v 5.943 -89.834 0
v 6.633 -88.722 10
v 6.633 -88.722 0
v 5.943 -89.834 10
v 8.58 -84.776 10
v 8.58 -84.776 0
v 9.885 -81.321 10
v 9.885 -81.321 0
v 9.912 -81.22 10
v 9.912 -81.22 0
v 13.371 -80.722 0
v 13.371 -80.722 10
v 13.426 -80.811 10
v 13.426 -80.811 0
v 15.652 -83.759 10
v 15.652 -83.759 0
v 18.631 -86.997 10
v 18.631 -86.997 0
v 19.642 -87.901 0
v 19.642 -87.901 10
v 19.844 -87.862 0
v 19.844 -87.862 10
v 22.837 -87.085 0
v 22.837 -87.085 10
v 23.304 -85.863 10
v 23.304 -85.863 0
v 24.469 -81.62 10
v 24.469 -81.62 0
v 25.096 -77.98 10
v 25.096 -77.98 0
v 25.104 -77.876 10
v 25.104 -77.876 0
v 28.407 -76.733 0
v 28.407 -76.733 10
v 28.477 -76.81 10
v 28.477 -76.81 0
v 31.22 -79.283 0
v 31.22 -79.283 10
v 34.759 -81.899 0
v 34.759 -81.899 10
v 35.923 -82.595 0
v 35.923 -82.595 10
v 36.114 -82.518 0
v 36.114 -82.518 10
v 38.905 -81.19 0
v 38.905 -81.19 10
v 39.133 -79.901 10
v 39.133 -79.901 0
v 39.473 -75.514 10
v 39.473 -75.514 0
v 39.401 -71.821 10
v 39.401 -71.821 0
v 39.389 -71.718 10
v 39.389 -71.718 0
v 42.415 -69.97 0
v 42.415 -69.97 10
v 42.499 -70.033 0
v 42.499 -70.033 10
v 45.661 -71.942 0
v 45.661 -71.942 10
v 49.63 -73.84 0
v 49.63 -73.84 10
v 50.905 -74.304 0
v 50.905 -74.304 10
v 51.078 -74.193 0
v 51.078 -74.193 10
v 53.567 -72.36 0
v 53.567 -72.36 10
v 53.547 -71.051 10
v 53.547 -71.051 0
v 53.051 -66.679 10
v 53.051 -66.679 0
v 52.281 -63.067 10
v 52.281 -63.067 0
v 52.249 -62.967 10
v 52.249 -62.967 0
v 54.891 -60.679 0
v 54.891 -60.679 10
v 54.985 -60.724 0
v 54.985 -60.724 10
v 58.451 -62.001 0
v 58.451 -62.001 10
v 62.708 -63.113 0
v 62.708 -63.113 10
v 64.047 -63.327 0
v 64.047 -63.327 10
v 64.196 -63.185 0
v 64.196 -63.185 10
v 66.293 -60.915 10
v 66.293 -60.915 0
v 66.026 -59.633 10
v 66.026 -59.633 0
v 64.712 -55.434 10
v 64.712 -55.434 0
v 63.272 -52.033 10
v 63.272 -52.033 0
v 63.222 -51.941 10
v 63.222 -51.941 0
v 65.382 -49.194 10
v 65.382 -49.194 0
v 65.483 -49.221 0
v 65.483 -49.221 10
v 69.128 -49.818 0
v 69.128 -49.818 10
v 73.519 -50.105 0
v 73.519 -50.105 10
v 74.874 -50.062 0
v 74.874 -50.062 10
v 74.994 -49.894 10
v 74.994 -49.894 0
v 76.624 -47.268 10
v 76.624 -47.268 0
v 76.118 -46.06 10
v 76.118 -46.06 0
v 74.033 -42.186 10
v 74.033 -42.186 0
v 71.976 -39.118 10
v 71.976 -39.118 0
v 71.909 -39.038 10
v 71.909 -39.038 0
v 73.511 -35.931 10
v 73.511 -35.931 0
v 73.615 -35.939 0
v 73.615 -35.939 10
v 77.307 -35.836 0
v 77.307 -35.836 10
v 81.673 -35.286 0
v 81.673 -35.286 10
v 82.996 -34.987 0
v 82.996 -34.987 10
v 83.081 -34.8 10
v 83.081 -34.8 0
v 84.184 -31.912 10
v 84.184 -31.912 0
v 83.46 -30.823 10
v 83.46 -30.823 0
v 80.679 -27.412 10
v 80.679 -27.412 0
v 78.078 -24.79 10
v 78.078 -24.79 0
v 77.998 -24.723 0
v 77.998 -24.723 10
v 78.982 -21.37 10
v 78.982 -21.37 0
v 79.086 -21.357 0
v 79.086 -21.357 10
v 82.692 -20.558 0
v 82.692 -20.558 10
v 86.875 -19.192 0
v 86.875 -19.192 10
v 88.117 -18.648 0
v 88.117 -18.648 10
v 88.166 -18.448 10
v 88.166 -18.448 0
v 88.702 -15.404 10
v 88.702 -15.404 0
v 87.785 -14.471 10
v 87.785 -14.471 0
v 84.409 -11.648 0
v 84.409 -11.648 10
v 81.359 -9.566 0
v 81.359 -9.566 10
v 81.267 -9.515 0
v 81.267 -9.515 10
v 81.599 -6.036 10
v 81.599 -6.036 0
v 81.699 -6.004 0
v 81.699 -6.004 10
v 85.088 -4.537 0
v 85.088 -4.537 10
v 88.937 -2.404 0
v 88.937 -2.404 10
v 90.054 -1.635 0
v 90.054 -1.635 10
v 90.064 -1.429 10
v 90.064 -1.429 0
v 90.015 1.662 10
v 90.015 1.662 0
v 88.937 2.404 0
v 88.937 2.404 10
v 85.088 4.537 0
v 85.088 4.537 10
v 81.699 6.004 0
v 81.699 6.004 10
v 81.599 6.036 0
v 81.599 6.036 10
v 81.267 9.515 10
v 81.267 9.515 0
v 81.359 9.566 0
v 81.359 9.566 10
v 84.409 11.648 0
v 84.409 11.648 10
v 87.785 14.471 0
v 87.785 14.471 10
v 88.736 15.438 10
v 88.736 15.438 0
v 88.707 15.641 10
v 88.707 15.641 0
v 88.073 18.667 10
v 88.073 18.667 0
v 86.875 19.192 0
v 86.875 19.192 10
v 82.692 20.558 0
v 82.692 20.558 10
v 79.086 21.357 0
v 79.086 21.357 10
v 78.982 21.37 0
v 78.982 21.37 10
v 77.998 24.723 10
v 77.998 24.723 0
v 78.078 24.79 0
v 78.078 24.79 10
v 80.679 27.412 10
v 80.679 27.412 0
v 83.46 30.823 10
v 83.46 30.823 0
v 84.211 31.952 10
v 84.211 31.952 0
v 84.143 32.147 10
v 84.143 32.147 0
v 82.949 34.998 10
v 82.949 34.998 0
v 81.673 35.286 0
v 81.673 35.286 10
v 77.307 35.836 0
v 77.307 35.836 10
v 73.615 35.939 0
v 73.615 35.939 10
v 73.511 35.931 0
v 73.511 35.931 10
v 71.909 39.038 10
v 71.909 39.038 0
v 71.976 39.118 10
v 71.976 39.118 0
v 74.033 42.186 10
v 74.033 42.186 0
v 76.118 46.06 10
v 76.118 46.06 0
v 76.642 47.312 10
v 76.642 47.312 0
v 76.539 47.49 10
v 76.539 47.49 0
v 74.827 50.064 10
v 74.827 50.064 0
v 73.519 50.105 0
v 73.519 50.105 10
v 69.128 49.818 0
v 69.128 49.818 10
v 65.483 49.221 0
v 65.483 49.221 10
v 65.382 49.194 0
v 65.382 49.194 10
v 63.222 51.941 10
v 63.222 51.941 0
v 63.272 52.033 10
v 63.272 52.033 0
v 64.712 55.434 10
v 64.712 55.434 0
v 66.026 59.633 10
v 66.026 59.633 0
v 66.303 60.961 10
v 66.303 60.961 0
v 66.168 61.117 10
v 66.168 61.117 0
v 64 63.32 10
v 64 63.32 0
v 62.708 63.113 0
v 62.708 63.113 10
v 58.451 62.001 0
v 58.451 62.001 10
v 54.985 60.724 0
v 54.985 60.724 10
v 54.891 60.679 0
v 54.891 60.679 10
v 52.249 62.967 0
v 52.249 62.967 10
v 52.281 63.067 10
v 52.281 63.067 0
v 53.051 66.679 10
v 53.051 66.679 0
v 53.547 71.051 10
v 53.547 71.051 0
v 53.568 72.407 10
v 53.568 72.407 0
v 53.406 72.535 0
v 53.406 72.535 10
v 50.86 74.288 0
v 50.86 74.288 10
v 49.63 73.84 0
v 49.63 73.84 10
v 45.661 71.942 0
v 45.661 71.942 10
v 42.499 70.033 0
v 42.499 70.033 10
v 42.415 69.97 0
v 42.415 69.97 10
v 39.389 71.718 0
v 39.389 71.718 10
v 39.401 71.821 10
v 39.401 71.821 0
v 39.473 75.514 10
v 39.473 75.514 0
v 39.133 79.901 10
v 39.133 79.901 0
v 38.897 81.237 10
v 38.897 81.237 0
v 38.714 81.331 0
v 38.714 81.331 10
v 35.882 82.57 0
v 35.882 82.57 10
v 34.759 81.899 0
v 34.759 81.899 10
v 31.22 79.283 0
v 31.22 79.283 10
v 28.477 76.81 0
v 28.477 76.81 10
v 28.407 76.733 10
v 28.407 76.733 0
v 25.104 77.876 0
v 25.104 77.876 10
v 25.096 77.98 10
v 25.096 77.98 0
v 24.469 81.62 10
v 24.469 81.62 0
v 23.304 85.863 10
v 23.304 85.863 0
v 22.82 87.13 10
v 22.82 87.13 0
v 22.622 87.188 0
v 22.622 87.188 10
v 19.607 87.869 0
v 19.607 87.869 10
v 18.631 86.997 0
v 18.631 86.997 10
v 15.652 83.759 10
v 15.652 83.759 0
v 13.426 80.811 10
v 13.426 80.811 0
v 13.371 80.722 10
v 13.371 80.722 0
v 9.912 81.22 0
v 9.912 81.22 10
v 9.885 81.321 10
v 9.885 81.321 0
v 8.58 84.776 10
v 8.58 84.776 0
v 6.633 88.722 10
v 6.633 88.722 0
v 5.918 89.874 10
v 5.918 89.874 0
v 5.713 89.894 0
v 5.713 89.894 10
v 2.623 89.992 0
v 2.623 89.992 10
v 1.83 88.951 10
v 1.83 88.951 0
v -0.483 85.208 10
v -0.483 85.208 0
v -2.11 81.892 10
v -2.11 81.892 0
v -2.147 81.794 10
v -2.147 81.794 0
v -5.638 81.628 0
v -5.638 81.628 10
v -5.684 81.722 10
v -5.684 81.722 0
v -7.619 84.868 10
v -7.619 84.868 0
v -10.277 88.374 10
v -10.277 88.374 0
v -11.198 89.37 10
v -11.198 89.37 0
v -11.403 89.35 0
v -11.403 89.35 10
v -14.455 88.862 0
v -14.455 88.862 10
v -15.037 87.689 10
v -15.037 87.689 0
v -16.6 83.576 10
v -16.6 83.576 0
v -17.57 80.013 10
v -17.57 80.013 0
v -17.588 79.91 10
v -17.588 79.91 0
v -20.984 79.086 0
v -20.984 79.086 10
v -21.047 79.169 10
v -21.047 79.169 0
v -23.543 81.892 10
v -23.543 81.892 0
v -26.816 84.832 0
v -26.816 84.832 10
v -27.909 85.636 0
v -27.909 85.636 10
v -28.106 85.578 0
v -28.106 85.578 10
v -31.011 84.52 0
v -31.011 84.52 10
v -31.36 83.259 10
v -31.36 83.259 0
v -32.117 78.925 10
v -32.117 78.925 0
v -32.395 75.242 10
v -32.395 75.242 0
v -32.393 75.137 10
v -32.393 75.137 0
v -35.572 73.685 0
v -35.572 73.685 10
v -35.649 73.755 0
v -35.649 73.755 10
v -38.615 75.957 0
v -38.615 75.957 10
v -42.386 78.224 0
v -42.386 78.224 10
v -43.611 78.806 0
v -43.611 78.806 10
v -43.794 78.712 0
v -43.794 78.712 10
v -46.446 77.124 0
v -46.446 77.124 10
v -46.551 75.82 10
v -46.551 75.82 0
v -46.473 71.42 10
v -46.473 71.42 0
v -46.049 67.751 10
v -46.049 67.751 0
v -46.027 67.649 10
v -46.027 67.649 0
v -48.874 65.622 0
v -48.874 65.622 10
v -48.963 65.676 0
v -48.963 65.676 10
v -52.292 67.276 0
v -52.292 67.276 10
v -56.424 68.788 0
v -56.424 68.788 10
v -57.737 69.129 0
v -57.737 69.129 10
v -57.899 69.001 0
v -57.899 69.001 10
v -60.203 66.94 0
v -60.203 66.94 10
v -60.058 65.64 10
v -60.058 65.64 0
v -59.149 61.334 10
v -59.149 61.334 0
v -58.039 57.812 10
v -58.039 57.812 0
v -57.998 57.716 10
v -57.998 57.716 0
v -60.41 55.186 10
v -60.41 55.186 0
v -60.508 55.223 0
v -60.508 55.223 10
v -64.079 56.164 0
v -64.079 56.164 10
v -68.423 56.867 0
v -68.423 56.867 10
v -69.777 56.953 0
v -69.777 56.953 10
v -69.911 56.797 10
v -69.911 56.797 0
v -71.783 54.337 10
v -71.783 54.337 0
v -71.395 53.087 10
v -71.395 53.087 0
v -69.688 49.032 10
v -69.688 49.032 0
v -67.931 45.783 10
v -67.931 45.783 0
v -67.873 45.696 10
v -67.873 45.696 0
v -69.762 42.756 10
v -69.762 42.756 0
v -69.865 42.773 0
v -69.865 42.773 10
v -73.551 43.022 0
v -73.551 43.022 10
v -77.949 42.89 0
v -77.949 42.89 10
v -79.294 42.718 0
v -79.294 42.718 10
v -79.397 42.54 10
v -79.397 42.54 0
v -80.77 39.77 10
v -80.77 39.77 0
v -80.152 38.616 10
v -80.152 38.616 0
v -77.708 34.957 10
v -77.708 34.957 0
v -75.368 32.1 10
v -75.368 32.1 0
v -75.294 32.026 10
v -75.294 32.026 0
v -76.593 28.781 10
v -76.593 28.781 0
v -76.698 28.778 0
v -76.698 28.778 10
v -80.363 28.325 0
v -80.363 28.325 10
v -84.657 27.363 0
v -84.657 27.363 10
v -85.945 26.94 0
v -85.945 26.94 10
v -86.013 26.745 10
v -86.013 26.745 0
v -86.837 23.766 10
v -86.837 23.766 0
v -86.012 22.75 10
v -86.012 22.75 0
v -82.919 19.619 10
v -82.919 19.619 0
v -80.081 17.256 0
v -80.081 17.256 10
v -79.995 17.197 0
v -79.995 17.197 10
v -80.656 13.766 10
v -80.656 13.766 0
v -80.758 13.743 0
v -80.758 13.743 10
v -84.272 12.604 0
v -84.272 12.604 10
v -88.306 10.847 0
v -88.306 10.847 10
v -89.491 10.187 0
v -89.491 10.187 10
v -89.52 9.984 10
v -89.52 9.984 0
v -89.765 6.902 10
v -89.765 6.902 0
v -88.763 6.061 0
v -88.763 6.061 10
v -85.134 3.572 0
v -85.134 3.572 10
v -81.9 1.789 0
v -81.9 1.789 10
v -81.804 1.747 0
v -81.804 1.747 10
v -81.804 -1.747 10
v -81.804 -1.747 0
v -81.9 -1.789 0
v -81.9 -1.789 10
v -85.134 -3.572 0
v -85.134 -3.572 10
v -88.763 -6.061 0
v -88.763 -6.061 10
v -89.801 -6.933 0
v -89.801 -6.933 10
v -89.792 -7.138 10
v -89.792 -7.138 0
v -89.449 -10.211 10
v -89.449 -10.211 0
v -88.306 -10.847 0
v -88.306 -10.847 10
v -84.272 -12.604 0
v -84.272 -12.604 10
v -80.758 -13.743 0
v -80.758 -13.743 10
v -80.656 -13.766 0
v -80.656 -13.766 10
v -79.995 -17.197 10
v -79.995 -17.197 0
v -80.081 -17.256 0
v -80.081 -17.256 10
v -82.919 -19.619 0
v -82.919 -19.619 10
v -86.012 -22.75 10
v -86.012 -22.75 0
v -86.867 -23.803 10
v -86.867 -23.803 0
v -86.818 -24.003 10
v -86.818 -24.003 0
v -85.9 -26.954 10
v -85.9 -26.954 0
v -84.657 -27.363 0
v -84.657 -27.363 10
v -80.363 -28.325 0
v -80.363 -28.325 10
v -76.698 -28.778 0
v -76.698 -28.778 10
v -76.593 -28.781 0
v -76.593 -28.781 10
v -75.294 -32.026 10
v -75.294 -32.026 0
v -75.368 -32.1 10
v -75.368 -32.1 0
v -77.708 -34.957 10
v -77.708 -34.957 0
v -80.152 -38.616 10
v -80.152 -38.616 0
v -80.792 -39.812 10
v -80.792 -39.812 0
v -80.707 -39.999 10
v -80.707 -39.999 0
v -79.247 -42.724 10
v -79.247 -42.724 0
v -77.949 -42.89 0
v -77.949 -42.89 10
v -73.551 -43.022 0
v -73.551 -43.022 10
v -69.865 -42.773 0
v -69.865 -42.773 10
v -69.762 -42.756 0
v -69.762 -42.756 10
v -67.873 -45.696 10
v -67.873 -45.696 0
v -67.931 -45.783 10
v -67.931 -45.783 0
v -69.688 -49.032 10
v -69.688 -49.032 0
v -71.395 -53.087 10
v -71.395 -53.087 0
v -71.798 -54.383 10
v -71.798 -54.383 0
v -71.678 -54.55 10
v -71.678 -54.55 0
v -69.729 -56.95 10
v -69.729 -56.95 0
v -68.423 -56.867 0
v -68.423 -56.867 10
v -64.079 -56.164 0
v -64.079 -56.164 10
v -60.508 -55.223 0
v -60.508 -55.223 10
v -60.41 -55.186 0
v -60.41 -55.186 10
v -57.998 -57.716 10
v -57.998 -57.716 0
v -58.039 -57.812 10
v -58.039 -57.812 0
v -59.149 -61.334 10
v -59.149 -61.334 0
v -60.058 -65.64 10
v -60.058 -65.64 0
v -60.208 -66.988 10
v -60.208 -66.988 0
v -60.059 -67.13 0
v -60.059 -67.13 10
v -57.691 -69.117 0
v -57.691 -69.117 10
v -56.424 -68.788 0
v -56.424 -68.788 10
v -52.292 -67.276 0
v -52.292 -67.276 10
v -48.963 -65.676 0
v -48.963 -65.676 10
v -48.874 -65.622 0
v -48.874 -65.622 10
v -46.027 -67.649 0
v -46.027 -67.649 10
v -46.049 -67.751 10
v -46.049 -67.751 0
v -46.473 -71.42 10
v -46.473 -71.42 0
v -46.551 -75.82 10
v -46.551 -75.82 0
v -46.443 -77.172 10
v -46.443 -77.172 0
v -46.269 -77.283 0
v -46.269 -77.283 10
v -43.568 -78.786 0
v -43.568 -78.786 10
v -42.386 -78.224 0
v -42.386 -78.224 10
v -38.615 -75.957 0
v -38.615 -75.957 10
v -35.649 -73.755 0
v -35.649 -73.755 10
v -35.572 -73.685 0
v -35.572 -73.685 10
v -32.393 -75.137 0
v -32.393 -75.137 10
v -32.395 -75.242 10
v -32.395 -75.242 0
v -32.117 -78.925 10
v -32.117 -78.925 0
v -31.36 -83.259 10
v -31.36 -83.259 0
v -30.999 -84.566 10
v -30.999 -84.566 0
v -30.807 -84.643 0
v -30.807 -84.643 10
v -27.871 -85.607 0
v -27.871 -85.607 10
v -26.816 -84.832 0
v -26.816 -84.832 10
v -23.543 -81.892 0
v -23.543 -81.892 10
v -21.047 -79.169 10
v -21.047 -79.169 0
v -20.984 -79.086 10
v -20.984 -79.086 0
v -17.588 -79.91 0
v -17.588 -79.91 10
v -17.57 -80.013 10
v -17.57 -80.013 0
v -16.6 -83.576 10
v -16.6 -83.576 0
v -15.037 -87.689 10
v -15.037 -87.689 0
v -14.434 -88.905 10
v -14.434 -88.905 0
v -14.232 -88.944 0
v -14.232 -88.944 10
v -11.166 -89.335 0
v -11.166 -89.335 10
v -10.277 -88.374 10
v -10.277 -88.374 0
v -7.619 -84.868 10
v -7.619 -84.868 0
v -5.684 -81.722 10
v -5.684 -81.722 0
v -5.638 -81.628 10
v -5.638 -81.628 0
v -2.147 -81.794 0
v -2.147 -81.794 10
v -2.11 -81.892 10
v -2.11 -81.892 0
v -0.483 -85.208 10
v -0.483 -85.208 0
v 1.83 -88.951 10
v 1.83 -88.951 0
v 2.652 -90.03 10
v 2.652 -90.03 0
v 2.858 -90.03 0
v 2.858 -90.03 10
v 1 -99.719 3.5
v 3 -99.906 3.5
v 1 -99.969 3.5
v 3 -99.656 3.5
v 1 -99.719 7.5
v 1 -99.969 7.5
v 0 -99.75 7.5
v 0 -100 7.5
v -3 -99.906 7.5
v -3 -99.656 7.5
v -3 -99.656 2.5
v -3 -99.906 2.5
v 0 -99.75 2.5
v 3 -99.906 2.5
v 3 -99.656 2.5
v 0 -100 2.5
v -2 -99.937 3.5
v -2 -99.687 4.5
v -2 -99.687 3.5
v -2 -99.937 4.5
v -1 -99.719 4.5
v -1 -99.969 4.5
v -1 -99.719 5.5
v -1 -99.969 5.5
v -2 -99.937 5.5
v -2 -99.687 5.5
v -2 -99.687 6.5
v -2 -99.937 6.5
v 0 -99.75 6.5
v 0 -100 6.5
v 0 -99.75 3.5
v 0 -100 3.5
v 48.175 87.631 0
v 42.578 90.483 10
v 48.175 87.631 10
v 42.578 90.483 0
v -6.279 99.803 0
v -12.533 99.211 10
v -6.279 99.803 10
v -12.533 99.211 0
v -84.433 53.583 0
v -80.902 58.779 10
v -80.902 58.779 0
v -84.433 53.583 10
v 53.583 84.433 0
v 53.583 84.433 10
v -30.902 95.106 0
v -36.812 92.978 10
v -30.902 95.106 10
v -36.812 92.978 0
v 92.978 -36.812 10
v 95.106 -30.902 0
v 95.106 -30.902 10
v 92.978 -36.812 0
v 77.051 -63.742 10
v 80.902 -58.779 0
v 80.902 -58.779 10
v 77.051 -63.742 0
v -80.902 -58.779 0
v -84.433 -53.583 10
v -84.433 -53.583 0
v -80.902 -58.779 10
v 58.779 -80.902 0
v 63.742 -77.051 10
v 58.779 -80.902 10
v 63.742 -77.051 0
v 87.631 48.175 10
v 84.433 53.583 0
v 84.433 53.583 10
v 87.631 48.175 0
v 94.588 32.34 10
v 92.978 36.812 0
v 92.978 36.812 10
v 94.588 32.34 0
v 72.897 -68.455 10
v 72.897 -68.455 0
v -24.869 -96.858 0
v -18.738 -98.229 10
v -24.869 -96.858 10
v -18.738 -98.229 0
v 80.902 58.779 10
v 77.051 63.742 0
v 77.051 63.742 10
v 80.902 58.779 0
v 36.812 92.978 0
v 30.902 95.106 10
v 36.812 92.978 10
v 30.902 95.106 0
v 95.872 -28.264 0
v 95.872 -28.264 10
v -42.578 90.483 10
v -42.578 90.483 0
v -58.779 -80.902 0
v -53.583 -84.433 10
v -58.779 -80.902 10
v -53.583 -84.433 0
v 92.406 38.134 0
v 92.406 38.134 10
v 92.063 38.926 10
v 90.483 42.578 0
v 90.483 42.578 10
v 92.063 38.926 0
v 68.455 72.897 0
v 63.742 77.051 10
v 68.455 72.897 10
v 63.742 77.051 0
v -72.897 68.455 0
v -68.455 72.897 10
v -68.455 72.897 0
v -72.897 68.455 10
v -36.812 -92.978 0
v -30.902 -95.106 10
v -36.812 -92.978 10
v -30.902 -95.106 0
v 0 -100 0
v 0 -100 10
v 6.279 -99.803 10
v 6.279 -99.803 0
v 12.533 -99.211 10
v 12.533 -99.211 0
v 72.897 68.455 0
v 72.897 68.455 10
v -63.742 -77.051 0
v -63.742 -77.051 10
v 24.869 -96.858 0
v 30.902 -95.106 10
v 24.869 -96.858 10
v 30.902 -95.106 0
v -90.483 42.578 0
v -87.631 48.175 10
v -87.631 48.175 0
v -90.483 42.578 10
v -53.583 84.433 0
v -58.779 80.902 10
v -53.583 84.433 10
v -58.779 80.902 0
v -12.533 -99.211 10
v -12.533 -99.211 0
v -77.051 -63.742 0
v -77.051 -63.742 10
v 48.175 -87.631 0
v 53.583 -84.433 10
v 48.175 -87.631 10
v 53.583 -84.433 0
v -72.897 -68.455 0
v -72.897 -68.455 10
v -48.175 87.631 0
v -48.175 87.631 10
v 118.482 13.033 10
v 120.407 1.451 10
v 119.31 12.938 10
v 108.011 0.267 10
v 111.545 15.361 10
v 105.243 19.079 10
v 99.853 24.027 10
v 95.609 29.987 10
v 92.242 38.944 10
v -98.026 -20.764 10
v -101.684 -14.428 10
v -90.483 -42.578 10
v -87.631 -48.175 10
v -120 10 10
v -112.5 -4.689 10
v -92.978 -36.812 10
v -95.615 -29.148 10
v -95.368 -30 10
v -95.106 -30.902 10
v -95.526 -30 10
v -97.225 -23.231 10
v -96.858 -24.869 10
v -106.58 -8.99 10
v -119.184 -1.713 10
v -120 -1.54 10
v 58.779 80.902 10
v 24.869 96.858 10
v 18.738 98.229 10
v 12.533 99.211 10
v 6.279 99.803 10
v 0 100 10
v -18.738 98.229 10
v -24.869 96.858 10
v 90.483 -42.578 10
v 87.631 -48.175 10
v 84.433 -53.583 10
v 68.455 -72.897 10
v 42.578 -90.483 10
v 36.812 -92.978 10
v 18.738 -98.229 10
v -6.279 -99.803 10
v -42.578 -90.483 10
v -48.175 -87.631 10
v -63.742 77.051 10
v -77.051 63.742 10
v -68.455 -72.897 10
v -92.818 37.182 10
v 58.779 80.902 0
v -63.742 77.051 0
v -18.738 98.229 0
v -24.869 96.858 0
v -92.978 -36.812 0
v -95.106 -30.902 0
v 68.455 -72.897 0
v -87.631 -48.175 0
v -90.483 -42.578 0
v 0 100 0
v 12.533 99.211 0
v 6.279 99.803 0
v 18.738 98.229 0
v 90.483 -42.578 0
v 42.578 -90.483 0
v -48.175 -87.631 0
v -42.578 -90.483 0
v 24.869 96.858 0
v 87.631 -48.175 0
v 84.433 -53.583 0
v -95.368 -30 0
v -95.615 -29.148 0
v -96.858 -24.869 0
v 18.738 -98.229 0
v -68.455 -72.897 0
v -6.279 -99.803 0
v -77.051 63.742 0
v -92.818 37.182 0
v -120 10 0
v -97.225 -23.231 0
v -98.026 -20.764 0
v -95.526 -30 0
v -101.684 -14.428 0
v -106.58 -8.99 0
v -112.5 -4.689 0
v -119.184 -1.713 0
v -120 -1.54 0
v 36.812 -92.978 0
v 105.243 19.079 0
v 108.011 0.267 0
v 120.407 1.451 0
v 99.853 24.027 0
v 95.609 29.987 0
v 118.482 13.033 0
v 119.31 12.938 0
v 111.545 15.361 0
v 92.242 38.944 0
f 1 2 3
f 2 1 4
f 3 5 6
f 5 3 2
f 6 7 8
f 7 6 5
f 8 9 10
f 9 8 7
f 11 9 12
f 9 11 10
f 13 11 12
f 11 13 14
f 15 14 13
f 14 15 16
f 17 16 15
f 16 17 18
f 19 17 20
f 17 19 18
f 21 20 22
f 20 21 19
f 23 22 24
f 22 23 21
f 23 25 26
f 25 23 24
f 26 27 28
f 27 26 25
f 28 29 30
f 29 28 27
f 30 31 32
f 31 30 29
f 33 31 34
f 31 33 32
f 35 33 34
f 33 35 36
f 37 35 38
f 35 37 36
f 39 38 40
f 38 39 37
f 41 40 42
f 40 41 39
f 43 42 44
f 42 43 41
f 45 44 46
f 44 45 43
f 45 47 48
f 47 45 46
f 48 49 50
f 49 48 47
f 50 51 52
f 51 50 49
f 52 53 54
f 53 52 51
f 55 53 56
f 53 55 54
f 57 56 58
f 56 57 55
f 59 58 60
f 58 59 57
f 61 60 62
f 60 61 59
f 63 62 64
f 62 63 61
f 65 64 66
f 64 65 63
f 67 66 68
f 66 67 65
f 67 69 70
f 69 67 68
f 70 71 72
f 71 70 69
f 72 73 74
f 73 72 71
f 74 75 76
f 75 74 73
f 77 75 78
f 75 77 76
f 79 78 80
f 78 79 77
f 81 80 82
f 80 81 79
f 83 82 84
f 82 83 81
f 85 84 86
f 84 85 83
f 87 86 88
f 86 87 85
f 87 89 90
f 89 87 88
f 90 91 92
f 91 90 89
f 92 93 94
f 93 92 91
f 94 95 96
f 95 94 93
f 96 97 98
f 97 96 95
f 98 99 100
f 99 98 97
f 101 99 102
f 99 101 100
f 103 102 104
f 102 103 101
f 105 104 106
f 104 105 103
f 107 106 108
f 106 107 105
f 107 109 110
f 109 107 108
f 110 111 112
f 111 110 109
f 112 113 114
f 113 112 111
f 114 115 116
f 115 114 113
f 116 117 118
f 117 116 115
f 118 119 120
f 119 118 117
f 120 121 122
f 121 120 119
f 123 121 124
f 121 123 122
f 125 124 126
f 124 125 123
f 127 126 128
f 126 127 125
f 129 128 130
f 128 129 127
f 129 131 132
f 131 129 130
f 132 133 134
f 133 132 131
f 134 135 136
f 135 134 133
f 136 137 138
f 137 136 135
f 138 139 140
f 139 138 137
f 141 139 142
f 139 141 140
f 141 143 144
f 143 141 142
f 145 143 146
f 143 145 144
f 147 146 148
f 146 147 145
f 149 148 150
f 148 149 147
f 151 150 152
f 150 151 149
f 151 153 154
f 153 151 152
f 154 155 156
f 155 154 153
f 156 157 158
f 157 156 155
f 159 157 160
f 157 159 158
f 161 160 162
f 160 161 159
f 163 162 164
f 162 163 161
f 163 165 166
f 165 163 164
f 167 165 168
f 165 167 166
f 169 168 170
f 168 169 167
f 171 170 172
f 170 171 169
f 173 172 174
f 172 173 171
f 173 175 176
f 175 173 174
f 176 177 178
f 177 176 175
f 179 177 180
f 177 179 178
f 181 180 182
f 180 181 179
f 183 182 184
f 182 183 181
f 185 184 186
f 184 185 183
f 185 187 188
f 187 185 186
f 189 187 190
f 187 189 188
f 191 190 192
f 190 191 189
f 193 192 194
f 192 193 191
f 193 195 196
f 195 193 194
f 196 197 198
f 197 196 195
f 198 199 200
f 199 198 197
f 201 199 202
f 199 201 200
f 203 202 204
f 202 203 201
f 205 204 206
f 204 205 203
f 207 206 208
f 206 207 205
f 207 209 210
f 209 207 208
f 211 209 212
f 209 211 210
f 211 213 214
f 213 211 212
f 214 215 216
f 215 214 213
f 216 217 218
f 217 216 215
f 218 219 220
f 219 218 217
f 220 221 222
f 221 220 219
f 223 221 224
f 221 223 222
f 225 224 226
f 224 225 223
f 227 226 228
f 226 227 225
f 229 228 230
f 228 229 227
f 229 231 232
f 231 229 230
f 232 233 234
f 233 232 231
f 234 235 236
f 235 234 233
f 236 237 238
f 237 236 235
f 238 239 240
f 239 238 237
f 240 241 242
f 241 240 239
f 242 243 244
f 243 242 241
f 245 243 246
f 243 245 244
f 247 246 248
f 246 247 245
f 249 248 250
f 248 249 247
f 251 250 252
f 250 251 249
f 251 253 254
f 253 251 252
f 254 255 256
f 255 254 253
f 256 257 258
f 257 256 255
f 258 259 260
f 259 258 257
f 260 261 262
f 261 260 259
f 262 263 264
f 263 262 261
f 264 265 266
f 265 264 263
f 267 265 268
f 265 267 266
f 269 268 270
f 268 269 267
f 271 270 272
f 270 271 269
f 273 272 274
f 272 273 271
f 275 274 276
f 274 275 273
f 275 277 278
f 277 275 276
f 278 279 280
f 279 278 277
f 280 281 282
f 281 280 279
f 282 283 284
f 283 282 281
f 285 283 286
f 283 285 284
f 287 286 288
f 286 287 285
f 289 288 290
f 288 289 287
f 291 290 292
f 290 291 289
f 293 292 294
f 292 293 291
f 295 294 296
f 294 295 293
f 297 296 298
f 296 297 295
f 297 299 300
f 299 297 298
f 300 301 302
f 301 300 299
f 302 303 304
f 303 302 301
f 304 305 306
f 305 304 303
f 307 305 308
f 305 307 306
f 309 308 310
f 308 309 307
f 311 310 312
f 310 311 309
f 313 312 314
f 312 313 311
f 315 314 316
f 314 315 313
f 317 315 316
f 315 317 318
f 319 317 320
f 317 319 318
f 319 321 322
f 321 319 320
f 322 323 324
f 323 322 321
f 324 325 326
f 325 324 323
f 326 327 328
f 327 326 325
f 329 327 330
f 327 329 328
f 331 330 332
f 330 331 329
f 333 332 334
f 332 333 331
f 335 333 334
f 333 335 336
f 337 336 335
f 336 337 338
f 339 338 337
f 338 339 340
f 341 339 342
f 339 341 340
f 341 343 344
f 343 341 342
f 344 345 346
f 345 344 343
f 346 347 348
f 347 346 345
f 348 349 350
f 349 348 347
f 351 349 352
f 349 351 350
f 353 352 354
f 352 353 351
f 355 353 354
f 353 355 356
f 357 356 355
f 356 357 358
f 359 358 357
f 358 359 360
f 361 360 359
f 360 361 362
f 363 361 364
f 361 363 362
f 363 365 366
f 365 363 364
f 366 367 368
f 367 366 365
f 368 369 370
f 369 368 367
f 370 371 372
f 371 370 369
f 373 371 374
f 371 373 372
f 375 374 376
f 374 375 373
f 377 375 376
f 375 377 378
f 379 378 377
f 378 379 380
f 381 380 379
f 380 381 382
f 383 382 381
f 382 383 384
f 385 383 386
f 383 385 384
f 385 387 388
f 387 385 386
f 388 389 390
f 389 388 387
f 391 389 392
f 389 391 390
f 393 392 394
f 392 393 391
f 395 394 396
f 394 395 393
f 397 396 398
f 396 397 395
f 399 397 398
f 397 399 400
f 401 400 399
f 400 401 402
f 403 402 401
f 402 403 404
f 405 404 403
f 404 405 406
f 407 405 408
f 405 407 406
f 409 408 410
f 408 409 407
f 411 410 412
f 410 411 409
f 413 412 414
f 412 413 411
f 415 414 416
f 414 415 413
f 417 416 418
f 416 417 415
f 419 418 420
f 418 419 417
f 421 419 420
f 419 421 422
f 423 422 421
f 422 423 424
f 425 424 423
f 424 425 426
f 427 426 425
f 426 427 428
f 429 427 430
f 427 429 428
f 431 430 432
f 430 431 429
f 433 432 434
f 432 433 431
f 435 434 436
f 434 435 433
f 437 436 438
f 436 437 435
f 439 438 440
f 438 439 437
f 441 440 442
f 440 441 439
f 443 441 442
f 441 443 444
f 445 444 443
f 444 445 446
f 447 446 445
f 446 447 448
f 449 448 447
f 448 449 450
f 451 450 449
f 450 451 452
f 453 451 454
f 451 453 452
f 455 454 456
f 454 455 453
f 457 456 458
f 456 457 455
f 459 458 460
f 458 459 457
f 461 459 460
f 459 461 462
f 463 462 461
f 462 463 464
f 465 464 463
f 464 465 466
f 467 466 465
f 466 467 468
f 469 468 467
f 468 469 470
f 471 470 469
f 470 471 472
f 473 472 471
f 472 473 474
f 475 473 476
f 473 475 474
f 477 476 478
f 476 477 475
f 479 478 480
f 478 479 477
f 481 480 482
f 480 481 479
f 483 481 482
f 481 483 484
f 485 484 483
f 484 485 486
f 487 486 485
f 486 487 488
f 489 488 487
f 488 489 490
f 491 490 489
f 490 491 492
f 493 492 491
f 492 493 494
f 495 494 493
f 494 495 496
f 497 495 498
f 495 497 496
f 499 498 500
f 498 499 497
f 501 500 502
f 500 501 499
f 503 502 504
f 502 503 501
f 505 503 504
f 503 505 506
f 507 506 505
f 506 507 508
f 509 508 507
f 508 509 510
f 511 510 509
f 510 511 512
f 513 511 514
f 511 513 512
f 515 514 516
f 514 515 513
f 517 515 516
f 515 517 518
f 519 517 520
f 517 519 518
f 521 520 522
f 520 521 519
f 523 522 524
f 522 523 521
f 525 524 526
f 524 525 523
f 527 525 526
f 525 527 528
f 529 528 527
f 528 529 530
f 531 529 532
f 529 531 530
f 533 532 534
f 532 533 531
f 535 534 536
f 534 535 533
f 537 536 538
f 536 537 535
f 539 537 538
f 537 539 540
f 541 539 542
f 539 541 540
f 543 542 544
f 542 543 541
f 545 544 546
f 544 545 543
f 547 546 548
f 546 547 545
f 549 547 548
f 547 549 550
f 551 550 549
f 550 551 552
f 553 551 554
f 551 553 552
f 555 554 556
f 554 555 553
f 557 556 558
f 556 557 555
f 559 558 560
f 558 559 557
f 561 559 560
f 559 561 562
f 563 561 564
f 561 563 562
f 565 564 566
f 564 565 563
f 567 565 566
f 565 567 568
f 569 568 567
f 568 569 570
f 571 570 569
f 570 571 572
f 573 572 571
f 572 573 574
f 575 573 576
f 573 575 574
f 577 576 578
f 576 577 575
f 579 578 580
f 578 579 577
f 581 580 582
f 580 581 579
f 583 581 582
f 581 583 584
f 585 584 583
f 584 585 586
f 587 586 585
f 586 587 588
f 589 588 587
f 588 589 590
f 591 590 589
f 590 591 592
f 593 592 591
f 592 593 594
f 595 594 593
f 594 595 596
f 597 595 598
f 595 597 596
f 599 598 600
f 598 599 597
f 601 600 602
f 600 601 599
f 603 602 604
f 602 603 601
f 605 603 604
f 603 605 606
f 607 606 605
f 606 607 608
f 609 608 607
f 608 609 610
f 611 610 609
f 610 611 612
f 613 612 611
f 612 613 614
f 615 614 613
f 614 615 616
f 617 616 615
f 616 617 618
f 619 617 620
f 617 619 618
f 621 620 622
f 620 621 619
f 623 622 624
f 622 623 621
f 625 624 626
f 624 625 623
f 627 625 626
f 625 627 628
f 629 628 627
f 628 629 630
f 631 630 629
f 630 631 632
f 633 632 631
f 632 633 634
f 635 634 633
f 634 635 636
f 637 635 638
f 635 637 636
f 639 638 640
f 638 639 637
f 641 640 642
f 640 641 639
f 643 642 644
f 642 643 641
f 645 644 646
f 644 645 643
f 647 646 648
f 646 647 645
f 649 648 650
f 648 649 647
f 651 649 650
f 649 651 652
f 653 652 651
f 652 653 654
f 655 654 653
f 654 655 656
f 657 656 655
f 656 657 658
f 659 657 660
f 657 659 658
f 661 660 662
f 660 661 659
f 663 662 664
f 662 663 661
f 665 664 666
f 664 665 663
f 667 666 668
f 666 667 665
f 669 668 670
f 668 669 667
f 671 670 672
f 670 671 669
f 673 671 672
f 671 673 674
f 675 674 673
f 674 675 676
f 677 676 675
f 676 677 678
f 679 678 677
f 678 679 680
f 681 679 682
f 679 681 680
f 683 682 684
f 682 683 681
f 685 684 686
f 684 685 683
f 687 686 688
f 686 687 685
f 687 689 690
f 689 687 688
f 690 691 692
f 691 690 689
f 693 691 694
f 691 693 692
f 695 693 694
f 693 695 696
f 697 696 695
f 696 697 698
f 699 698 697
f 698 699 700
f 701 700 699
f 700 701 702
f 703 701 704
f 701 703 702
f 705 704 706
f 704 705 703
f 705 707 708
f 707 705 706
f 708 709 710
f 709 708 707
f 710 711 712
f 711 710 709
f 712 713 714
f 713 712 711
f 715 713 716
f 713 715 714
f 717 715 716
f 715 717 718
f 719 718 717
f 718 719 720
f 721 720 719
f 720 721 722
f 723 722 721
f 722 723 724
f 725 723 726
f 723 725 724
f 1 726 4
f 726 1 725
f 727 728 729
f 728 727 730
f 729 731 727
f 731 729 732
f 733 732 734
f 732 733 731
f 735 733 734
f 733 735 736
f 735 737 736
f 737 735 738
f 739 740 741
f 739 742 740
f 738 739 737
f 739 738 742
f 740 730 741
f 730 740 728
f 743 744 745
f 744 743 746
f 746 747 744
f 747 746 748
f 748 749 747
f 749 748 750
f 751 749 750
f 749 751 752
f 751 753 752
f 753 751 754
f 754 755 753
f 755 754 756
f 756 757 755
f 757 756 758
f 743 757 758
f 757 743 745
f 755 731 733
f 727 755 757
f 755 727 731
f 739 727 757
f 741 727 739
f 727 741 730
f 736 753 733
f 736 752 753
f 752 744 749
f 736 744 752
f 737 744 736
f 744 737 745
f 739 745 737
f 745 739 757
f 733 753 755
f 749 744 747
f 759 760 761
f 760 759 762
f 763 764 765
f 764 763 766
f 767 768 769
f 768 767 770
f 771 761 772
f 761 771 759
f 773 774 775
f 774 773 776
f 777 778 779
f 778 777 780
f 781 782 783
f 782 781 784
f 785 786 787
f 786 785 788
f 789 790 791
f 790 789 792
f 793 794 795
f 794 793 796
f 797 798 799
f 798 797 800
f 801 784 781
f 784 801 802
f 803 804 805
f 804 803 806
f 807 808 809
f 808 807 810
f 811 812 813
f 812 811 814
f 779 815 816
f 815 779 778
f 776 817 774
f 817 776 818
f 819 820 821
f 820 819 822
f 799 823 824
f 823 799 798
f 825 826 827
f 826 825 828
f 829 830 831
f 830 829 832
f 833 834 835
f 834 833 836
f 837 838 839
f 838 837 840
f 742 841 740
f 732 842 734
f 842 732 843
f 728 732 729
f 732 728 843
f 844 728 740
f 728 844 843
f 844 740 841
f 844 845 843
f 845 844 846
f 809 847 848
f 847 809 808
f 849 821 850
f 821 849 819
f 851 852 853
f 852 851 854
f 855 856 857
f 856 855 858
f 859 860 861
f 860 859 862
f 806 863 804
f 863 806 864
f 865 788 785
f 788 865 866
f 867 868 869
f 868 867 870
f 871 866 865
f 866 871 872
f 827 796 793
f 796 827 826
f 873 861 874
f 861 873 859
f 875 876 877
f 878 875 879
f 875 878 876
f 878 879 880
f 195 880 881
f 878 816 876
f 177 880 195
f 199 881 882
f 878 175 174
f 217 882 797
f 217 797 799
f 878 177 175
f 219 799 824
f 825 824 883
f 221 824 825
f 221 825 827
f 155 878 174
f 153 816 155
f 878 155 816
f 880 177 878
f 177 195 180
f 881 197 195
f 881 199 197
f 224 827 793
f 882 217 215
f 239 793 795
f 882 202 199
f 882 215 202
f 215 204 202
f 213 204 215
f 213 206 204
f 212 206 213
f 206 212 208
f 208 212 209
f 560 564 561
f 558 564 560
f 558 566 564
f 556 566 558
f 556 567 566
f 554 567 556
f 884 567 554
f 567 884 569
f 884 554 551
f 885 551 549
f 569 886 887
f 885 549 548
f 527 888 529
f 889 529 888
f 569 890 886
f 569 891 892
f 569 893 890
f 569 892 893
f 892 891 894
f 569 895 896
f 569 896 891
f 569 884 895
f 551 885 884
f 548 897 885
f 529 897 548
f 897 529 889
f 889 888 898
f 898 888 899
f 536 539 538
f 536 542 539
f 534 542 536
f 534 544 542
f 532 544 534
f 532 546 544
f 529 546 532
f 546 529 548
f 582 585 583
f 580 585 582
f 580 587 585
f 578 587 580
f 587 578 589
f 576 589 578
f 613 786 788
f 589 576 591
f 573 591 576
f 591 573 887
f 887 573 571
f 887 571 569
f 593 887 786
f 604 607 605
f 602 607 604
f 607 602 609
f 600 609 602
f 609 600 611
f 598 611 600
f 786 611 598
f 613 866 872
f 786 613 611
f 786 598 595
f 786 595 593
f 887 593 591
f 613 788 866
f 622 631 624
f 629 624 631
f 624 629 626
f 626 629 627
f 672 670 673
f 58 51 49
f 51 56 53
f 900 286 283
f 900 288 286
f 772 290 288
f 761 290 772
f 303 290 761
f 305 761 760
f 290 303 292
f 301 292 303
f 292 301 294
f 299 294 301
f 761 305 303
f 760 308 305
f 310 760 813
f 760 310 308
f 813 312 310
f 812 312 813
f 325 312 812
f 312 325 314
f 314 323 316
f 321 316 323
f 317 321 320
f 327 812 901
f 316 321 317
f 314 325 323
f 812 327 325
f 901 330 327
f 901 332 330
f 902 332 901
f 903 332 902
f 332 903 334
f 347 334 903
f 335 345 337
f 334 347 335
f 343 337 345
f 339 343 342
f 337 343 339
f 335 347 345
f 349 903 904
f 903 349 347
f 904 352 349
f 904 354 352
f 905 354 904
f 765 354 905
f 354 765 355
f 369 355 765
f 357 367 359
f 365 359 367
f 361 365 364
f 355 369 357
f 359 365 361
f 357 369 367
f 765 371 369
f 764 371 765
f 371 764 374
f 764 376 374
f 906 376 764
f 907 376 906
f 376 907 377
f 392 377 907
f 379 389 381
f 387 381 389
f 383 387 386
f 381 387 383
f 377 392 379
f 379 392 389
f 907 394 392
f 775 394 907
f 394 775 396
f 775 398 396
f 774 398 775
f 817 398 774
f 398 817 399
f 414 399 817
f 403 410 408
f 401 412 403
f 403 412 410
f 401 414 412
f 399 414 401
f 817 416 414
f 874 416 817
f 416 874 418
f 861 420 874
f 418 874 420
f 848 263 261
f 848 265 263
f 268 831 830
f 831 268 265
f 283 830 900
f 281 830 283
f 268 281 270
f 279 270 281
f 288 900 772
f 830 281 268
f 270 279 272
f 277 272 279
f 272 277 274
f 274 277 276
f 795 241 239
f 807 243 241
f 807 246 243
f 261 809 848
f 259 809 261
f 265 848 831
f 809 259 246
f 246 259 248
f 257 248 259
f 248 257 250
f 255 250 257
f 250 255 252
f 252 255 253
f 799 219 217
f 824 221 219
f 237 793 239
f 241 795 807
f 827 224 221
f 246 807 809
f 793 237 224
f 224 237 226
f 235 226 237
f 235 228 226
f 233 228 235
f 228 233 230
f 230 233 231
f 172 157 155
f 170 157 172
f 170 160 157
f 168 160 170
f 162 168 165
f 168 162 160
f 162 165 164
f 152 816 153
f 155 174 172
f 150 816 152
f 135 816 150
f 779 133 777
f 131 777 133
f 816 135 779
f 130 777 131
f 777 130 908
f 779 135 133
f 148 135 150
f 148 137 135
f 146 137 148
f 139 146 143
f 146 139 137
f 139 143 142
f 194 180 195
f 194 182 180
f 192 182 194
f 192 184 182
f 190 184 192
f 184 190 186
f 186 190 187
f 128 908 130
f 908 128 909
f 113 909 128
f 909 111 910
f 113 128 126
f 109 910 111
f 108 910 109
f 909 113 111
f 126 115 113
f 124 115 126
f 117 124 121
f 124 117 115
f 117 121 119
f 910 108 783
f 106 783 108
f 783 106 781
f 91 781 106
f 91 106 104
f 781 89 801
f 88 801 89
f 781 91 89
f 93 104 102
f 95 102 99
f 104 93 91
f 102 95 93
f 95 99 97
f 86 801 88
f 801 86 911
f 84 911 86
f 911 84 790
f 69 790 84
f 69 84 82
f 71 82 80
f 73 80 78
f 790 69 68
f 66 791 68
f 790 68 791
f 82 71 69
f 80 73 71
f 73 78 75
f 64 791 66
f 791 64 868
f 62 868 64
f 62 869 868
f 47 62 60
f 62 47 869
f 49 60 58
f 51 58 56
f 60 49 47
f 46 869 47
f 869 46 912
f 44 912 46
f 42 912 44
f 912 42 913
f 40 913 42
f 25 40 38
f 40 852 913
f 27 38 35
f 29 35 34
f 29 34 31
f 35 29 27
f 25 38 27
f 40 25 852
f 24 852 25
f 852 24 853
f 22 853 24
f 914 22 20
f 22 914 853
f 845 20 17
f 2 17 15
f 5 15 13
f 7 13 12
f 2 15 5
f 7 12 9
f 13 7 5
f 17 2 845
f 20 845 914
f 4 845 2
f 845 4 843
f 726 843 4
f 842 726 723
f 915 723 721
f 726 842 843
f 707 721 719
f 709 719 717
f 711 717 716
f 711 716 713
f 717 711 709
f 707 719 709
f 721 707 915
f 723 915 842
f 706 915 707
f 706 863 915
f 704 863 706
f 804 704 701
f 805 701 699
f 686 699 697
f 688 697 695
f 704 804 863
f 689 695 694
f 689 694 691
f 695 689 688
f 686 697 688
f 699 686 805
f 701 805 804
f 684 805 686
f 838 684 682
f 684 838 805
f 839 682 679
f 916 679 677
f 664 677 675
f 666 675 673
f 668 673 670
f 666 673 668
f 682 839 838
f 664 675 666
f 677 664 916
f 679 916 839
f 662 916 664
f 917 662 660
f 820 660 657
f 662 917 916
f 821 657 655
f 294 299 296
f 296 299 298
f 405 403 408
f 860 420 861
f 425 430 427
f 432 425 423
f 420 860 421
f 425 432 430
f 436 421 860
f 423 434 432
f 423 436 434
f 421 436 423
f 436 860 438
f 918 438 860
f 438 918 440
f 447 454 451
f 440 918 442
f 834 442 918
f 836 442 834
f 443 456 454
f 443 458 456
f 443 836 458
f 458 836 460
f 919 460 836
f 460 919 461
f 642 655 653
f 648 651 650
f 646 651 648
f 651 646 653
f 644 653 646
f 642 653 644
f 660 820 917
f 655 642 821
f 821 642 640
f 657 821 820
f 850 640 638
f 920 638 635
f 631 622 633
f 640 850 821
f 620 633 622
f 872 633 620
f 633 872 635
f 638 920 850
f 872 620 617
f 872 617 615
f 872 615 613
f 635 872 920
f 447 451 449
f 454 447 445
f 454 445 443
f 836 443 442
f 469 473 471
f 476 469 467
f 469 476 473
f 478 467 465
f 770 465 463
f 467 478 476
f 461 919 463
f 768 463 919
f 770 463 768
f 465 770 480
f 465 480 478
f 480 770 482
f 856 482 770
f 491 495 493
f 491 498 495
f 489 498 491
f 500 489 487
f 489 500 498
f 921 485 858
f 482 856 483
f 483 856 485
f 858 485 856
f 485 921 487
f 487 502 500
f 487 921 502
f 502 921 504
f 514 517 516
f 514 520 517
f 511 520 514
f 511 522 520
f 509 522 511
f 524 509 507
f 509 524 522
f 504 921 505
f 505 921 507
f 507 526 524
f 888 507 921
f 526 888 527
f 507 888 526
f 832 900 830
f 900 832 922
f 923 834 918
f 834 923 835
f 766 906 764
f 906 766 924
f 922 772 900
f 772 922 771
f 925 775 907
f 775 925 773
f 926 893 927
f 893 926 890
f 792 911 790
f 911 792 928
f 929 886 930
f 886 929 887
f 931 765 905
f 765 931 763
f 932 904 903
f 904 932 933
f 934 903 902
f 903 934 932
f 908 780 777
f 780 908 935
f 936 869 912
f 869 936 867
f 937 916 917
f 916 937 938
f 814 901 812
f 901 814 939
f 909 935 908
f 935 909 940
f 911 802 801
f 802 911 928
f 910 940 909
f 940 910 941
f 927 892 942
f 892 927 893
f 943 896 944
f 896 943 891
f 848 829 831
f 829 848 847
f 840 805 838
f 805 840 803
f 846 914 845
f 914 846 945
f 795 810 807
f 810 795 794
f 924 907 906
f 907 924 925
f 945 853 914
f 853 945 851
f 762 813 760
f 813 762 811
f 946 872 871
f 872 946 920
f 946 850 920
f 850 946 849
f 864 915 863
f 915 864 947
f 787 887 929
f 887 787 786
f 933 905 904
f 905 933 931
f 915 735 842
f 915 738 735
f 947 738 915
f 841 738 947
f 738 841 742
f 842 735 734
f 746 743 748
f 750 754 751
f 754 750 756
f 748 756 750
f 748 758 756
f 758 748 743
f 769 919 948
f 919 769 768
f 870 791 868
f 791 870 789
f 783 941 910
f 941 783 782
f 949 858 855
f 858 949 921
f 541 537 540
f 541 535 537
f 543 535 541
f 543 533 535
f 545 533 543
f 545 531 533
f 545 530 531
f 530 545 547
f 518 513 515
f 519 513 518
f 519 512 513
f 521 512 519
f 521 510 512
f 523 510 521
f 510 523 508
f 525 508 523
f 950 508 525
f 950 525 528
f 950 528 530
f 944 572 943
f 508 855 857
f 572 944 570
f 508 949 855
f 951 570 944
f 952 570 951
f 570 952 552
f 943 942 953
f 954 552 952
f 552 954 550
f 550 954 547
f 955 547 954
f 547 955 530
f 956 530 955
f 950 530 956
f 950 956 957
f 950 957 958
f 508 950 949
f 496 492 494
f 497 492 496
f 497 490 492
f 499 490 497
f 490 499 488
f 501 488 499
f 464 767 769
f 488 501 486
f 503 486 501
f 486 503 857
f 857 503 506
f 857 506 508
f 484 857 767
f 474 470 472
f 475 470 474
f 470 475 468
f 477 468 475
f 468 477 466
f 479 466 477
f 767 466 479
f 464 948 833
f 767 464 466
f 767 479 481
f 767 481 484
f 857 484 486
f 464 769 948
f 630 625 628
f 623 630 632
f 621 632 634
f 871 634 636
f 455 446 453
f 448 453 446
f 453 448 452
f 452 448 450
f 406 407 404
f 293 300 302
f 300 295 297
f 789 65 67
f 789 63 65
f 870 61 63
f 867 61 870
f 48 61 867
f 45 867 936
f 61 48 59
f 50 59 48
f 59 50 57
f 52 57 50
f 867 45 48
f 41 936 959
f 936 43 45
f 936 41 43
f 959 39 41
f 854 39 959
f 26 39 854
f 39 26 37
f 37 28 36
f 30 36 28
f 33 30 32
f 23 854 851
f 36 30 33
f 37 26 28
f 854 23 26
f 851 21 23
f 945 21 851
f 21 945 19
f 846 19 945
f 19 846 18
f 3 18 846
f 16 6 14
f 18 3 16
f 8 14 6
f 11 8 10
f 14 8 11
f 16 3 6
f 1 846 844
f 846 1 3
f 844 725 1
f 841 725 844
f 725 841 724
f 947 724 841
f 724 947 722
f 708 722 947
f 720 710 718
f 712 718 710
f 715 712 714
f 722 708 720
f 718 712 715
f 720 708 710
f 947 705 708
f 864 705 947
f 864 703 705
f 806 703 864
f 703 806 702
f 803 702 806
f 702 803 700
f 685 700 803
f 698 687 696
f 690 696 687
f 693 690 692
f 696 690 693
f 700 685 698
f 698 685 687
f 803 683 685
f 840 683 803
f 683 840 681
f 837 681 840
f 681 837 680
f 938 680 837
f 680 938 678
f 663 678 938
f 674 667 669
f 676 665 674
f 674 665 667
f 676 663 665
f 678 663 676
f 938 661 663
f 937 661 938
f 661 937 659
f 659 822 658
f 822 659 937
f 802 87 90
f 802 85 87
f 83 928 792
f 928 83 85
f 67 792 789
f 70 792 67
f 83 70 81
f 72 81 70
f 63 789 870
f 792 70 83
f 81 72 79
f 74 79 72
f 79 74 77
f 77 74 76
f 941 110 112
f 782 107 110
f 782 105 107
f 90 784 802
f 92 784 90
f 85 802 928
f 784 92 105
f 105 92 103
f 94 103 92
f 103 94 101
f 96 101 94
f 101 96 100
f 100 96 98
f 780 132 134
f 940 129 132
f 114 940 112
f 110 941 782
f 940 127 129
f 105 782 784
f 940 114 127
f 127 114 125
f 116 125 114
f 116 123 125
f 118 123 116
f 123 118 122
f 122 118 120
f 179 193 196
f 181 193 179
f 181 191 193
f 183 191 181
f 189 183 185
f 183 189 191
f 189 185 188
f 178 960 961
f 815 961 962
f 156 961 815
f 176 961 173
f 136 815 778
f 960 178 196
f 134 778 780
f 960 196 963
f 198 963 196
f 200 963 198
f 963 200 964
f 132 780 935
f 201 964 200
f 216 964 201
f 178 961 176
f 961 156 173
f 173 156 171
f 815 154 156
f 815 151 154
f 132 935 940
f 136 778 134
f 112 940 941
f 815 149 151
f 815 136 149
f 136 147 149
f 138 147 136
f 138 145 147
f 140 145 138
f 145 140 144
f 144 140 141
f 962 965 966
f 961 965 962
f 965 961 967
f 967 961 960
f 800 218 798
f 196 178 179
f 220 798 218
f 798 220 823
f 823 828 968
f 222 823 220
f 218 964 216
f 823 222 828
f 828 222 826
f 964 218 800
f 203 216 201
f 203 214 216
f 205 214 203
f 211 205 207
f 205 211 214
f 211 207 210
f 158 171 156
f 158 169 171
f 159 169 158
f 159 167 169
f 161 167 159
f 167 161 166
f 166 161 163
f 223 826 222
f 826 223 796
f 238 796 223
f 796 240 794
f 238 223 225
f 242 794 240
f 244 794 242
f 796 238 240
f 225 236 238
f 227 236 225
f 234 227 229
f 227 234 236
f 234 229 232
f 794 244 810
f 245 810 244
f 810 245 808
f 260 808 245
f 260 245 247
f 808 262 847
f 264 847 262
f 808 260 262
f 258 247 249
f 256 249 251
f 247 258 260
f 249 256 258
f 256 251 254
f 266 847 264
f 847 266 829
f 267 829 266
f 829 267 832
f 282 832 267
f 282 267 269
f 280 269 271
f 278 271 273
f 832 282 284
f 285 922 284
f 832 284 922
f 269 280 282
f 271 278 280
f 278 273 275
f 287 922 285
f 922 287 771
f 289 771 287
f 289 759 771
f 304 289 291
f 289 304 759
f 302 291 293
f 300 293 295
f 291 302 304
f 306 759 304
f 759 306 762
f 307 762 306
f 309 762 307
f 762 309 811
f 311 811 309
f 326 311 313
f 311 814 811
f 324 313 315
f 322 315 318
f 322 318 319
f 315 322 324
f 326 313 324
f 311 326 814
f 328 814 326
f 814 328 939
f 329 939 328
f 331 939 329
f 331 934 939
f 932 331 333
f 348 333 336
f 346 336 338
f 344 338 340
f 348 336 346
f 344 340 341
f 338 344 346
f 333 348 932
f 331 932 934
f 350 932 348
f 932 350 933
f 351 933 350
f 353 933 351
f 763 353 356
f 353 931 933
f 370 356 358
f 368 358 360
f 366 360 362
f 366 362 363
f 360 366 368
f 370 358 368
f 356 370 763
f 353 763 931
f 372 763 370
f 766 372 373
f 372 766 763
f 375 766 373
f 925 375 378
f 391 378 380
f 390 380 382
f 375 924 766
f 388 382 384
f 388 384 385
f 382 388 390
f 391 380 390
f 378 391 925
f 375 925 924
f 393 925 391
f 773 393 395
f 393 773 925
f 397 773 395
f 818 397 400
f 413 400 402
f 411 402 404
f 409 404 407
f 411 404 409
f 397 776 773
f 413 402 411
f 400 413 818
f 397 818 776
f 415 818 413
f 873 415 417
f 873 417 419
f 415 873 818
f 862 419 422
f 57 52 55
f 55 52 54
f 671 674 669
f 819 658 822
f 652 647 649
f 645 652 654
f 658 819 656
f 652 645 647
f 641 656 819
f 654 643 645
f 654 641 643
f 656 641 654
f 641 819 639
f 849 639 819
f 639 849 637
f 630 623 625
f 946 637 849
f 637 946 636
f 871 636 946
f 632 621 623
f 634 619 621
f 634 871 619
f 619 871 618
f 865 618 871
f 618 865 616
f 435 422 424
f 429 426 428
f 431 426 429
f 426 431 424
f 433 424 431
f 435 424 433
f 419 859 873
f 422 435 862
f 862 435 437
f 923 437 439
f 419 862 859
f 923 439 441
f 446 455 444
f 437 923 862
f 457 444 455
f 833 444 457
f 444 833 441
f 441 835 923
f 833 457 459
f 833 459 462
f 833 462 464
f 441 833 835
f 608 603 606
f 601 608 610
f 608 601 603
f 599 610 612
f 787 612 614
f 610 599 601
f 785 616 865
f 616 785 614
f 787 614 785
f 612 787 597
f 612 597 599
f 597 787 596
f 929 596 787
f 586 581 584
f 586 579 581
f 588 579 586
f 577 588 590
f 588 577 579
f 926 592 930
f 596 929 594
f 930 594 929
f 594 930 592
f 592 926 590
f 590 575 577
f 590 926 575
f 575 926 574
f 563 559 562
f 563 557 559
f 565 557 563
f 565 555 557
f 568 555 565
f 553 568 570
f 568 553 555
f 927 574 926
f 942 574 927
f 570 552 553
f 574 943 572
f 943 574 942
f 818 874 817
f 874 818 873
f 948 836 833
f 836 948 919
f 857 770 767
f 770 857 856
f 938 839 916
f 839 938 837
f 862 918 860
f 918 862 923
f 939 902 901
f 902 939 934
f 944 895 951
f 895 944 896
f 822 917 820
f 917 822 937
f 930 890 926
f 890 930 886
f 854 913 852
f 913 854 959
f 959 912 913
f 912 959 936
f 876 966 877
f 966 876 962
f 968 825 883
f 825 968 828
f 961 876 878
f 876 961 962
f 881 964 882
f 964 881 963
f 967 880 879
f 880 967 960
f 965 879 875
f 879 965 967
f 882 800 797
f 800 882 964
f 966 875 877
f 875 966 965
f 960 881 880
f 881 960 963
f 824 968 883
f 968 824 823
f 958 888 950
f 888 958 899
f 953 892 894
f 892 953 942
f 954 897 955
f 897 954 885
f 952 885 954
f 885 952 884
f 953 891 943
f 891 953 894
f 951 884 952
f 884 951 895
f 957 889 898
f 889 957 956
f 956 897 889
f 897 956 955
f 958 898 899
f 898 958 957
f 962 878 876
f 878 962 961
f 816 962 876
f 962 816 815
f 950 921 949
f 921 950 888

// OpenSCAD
// Planetary gear bearing (customizable)

// outer diameter of ring
D=200;
// thickness
T=10;
// clearance
tol=0.15;
number_of_planets=3;
number_of_teeth_on_planets=12;
approximate_number_of_teeth_on_sun=8;
// pressure angle
P=30;//[30:60]
// number of teeth to twist across
nTwist=0;
// Shaft radius.  For round saft with a flat.
sd=27.9;
// Shaft thinkness at flat  For round saft with a flat..
st=27.9;
// Shaft type: 0=hex, 1=round w/flat.
stype=1;
// Planet axile diameter.
pad=10;

DR=0.5*1;// maximum depth ratio of teeth

m=round(number_of_planets);
np=round(number_of_teeth_on_planets);
ns1=approximate_number_of_teeth_on_sun;
k1=round(2/m*(ns1+np));
k= k1*m%2!=0 ? k1+1 : k1;
ns=k*m/2-np;
echo(ns);
nr=ns+2*np;
pitchD=0.9*D/(1+min(PI/(2*nr*tan(P)),PI*DR/nr));
pitch=pitchD*PI/nr;
echo(pitch);
helix_angle=atan(2*nTwist*pitch/T);
echo(helix_angle);

phi=$t*360/m;

translate([0,0,T/2]){
	difference(){ // This makes the outer ring.
		cylinder(r=D/2,h=T,center=true,$fn=100);
		herringbone(nr,pitch,P,DR,-tol,helix_angle,T+0.2);
		difference(){
			translate([0,-D/2,0])rotate([90,0,0])monogram(h=10);
			cylinder(r=D/2-0.25,h=T+2,center=true,$fn=100);
		}
	}
    // add bite to ring
    rotate([0,0,5.454])
        translate([120,-10,-T/2])
            rotate([0,270,90])
                prism(T,30,30);
    rotate([0,0,5.454])
        translate([95,-10,-T/2])
            difference() 
    {
                cube(size=[25,40,10]);
                translate([35,45,0])
                    cylinder(h=10, r=35);
            }
    // second one
    rotate([0,0,0])  // this looks good
        translate([-120,10,-T/2])
            rotate([0,270,270])
                prism(T,30,30);
    rotate([0,0,0])  // this looks good
        translate([-120,-30,-T/2])
            difference() {
                cube(size=[25,40,10]);
                translate([-10,-5,0])
                    cylinder(h=10, r=35);
            }
/*        
	rotate([0,0,(np+1)*180/ns+phi*(ns+np)*2/ns])
	difference(){ // This makes the sun.
		mirror([0,1,0])
			herringbone(ns,pitch,P,DR,tol,helix_angle,T);
		if(stype==0)
			cylinder(r=w/sqrt(3),h=T+1,center=true,$fn=6);
		else
			difference(){ // This makes a hole for a flat shaft.
				cylinder(r=sd/2,h=T+1,center=true,$fn=100);
				translate([st-(sd/2),-(sd/2),-(T+1)/2])
					cube([sd, sd, T+1]);	// This is the flat in the shaft hole.
			}
	}
	// Now make the planets.
	for(i=[1:m])
		rotate([0,0,i*360/m+phi])
			translate([pitchD/2*(ns+np)/nr,0,0])
				rotate([0,0,i*ns/m*360/np-phi*(ns+np)/np-phi])
					difference(){ // make an axial hole in each planet.
						herringbone(np/2,pitch,P,DR,tol,helix_angle,T);
						cylinder(r=pad/2,h=T+1,center=true,$fn=100);	// This is the hole.
					}
*/
}


// Makes the teeth on the inside of the outer ring.
module monogram(h=1)
linear_extrude(height=h,center=true)
translate(-[3,2.5])union(){
	difference(){
		square([4,5]);
		translate([1,1])square([2,3]);
	}
	square([6,1]);
	translate([0,2])square([2,1]);
}

module herringbone(
	number_of_teeth=15,
	circular_pitch=10,
	pressure_angle=28,
	depth_ratio=1,
	clearance=0,
	helix_angle=0,
	gear_thickness=5){
union(){
	gear(number_of_teeth,
		circular_pitch,
		pressure_angle,
		depth_ratio,
		clearance,
		helix_angle,
		gear_thickness/2);
	mirror([0,0,1])
		gear(number_of_teeth,
			circular_pitch,
			pressure_angle,
			depth_ratio,
			clearance,
			helix_angle,
			gear_thickness/2);
}}

module gear (
	number_of_teeth=15,
	circular_pitch=10,
	pressure_angle=28,
	depth_ratio=1,
	clearance=0,
	helix_angle=0,
	gear_thickness=5,
	flat=false){
pitch_radius = number_of_teeth*circular_pitch/(2*PI);
twist=tan(helix_angle)*gear_thickness/pitch_radius*180/PI;

flat_extrude(h=gear_thickness,twist=twist,flat=flat)
	gear2D (
		number_of_teeth,
		circular_pitch,
		pressure_angle,
		depth_ratio,
		clearance);
}

module flat_extrude(h,twist,flat){
	if(flat==false)
		linear_extrude(height=h,twist=twist,slices=twist/6)child(0);
	else
		child(0);
}

module gear2D (
	number_of_teeth,
	circular_pitch,
	pressure_angle,
	depth_ratio,
	clearance){
pitch_radius = number_of_teeth*circular_pitch/(2*PI);
base_radius = pitch_radius*cos(pressure_angle);
depth=circular_pitch/(2*tan(pressure_angle));
outer_radius = clearance<0 ? pitch_radius+depth/2-clearance : pitch_radius+depth/2;
root_radius1 = pitch_radius-depth/2-clearance/2;
root_radius = (clearance<0 && root_radius1<base_radius) ? base_radius : root_radius1;
backlash_angle = clearance/(pitch_radius*cos(pressure_angle)) * 180 / PI;
half_thick_angle = 90/number_of_teeth - backlash_angle/2;
pitch_point = involute (base_radius, involute_intersect_angle (base_radius, pitch_radius));
pitch_angle = atan2 (pitch_point[1], pitch_point[0]);
min_radius = max (base_radius,root_radius);

intersection(){
	rotate(90/number_of_teeth)
		circle($fn=number_of_teeth*3,r=pitch_radius+depth_ratio*circular_pitch/2-clearance/2);
	union(){
		rotate(90/number_of_teeth)
			circle($fn=number_of_teeth*2,r=max(root_radius,pitch_radius-depth_ratio*circular_pitch/2-clearance/2));
		for (i = [1:number_of_teeth])rotate(i*360/number_of_teeth){
			halftooth (
				pitch_angle,
				base_radius,
				min_radius,
				outer_radius,
				half_thick_angle);		
			mirror([0,1])halftooth (
				pitch_angle,
				base_radius,
				min_radius,
				outer_radius,
				half_thick_angle);
		}
	}
}}

module halftooth (
	pitch_angle,
	base_radius,
	min_radius,
	outer_radius,
	half_thick_angle){
index=[0,1,2,3,4,5];
start_angle = max(involute_intersect_angle (base_radius, min_radius)-5,0);
stop_angle = involute_intersect_angle (base_radius, outer_radius);
angle=index*(stop_angle-start_angle)/index[len(index)-1];
p=[[0,0], // The more of these the smoother the involute shape of the teeth.
	involute(base_radius,angle[0]+start_angle),
	involute(base_radius,angle[1]+start_angle),
	involute(base_radius,angle[2]+start_angle),
	involute(base_radius,angle[3]+start_angle),
	involute(base_radius,angle[4]+start_angle),
	involute(base_radius,angle[5]+start_angle)];

difference(){
	rotate(-pitch_angle-half_thick_angle)polygon(points=p);
	square(2*outer_radius);
}}

// Mathematical Functions
//===============

// Finds the angle of the involute about the base radius at the given distance (radius) from it's center.
//source: http://www.mathhelpforum.com/math-help/geometry/136011-circle-involute-solving-y-any-given-x.html

function involute_intersect_angle (base_radius, radius) = sqrt (pow (radius/base_radius, 2) - 1) * 180 / PI;

// Calculate the involute position for a given base radius and involute angle.

function involute (base_radius, involute_angle) =
[
	base_radius*(cos (involute_angle) + involute_angle*PI/180*sin (involute_angle)),
	base_radius*(sin (involute_angle) - involute_angle*PI/180*cos (involute_angle))
];



// prism function from openscad wiki
module prism(l, w, h){
   polyhedron(
       points=[[0,0,0], [l,0,0], [l,w,0], [0,w,0], [0,w,h], [l,w,h]],
       faces=[[0,1,2,3],[5,4,3,2],[0,4,5,1],[0,3,4],[5,2,1]]
     );
}
